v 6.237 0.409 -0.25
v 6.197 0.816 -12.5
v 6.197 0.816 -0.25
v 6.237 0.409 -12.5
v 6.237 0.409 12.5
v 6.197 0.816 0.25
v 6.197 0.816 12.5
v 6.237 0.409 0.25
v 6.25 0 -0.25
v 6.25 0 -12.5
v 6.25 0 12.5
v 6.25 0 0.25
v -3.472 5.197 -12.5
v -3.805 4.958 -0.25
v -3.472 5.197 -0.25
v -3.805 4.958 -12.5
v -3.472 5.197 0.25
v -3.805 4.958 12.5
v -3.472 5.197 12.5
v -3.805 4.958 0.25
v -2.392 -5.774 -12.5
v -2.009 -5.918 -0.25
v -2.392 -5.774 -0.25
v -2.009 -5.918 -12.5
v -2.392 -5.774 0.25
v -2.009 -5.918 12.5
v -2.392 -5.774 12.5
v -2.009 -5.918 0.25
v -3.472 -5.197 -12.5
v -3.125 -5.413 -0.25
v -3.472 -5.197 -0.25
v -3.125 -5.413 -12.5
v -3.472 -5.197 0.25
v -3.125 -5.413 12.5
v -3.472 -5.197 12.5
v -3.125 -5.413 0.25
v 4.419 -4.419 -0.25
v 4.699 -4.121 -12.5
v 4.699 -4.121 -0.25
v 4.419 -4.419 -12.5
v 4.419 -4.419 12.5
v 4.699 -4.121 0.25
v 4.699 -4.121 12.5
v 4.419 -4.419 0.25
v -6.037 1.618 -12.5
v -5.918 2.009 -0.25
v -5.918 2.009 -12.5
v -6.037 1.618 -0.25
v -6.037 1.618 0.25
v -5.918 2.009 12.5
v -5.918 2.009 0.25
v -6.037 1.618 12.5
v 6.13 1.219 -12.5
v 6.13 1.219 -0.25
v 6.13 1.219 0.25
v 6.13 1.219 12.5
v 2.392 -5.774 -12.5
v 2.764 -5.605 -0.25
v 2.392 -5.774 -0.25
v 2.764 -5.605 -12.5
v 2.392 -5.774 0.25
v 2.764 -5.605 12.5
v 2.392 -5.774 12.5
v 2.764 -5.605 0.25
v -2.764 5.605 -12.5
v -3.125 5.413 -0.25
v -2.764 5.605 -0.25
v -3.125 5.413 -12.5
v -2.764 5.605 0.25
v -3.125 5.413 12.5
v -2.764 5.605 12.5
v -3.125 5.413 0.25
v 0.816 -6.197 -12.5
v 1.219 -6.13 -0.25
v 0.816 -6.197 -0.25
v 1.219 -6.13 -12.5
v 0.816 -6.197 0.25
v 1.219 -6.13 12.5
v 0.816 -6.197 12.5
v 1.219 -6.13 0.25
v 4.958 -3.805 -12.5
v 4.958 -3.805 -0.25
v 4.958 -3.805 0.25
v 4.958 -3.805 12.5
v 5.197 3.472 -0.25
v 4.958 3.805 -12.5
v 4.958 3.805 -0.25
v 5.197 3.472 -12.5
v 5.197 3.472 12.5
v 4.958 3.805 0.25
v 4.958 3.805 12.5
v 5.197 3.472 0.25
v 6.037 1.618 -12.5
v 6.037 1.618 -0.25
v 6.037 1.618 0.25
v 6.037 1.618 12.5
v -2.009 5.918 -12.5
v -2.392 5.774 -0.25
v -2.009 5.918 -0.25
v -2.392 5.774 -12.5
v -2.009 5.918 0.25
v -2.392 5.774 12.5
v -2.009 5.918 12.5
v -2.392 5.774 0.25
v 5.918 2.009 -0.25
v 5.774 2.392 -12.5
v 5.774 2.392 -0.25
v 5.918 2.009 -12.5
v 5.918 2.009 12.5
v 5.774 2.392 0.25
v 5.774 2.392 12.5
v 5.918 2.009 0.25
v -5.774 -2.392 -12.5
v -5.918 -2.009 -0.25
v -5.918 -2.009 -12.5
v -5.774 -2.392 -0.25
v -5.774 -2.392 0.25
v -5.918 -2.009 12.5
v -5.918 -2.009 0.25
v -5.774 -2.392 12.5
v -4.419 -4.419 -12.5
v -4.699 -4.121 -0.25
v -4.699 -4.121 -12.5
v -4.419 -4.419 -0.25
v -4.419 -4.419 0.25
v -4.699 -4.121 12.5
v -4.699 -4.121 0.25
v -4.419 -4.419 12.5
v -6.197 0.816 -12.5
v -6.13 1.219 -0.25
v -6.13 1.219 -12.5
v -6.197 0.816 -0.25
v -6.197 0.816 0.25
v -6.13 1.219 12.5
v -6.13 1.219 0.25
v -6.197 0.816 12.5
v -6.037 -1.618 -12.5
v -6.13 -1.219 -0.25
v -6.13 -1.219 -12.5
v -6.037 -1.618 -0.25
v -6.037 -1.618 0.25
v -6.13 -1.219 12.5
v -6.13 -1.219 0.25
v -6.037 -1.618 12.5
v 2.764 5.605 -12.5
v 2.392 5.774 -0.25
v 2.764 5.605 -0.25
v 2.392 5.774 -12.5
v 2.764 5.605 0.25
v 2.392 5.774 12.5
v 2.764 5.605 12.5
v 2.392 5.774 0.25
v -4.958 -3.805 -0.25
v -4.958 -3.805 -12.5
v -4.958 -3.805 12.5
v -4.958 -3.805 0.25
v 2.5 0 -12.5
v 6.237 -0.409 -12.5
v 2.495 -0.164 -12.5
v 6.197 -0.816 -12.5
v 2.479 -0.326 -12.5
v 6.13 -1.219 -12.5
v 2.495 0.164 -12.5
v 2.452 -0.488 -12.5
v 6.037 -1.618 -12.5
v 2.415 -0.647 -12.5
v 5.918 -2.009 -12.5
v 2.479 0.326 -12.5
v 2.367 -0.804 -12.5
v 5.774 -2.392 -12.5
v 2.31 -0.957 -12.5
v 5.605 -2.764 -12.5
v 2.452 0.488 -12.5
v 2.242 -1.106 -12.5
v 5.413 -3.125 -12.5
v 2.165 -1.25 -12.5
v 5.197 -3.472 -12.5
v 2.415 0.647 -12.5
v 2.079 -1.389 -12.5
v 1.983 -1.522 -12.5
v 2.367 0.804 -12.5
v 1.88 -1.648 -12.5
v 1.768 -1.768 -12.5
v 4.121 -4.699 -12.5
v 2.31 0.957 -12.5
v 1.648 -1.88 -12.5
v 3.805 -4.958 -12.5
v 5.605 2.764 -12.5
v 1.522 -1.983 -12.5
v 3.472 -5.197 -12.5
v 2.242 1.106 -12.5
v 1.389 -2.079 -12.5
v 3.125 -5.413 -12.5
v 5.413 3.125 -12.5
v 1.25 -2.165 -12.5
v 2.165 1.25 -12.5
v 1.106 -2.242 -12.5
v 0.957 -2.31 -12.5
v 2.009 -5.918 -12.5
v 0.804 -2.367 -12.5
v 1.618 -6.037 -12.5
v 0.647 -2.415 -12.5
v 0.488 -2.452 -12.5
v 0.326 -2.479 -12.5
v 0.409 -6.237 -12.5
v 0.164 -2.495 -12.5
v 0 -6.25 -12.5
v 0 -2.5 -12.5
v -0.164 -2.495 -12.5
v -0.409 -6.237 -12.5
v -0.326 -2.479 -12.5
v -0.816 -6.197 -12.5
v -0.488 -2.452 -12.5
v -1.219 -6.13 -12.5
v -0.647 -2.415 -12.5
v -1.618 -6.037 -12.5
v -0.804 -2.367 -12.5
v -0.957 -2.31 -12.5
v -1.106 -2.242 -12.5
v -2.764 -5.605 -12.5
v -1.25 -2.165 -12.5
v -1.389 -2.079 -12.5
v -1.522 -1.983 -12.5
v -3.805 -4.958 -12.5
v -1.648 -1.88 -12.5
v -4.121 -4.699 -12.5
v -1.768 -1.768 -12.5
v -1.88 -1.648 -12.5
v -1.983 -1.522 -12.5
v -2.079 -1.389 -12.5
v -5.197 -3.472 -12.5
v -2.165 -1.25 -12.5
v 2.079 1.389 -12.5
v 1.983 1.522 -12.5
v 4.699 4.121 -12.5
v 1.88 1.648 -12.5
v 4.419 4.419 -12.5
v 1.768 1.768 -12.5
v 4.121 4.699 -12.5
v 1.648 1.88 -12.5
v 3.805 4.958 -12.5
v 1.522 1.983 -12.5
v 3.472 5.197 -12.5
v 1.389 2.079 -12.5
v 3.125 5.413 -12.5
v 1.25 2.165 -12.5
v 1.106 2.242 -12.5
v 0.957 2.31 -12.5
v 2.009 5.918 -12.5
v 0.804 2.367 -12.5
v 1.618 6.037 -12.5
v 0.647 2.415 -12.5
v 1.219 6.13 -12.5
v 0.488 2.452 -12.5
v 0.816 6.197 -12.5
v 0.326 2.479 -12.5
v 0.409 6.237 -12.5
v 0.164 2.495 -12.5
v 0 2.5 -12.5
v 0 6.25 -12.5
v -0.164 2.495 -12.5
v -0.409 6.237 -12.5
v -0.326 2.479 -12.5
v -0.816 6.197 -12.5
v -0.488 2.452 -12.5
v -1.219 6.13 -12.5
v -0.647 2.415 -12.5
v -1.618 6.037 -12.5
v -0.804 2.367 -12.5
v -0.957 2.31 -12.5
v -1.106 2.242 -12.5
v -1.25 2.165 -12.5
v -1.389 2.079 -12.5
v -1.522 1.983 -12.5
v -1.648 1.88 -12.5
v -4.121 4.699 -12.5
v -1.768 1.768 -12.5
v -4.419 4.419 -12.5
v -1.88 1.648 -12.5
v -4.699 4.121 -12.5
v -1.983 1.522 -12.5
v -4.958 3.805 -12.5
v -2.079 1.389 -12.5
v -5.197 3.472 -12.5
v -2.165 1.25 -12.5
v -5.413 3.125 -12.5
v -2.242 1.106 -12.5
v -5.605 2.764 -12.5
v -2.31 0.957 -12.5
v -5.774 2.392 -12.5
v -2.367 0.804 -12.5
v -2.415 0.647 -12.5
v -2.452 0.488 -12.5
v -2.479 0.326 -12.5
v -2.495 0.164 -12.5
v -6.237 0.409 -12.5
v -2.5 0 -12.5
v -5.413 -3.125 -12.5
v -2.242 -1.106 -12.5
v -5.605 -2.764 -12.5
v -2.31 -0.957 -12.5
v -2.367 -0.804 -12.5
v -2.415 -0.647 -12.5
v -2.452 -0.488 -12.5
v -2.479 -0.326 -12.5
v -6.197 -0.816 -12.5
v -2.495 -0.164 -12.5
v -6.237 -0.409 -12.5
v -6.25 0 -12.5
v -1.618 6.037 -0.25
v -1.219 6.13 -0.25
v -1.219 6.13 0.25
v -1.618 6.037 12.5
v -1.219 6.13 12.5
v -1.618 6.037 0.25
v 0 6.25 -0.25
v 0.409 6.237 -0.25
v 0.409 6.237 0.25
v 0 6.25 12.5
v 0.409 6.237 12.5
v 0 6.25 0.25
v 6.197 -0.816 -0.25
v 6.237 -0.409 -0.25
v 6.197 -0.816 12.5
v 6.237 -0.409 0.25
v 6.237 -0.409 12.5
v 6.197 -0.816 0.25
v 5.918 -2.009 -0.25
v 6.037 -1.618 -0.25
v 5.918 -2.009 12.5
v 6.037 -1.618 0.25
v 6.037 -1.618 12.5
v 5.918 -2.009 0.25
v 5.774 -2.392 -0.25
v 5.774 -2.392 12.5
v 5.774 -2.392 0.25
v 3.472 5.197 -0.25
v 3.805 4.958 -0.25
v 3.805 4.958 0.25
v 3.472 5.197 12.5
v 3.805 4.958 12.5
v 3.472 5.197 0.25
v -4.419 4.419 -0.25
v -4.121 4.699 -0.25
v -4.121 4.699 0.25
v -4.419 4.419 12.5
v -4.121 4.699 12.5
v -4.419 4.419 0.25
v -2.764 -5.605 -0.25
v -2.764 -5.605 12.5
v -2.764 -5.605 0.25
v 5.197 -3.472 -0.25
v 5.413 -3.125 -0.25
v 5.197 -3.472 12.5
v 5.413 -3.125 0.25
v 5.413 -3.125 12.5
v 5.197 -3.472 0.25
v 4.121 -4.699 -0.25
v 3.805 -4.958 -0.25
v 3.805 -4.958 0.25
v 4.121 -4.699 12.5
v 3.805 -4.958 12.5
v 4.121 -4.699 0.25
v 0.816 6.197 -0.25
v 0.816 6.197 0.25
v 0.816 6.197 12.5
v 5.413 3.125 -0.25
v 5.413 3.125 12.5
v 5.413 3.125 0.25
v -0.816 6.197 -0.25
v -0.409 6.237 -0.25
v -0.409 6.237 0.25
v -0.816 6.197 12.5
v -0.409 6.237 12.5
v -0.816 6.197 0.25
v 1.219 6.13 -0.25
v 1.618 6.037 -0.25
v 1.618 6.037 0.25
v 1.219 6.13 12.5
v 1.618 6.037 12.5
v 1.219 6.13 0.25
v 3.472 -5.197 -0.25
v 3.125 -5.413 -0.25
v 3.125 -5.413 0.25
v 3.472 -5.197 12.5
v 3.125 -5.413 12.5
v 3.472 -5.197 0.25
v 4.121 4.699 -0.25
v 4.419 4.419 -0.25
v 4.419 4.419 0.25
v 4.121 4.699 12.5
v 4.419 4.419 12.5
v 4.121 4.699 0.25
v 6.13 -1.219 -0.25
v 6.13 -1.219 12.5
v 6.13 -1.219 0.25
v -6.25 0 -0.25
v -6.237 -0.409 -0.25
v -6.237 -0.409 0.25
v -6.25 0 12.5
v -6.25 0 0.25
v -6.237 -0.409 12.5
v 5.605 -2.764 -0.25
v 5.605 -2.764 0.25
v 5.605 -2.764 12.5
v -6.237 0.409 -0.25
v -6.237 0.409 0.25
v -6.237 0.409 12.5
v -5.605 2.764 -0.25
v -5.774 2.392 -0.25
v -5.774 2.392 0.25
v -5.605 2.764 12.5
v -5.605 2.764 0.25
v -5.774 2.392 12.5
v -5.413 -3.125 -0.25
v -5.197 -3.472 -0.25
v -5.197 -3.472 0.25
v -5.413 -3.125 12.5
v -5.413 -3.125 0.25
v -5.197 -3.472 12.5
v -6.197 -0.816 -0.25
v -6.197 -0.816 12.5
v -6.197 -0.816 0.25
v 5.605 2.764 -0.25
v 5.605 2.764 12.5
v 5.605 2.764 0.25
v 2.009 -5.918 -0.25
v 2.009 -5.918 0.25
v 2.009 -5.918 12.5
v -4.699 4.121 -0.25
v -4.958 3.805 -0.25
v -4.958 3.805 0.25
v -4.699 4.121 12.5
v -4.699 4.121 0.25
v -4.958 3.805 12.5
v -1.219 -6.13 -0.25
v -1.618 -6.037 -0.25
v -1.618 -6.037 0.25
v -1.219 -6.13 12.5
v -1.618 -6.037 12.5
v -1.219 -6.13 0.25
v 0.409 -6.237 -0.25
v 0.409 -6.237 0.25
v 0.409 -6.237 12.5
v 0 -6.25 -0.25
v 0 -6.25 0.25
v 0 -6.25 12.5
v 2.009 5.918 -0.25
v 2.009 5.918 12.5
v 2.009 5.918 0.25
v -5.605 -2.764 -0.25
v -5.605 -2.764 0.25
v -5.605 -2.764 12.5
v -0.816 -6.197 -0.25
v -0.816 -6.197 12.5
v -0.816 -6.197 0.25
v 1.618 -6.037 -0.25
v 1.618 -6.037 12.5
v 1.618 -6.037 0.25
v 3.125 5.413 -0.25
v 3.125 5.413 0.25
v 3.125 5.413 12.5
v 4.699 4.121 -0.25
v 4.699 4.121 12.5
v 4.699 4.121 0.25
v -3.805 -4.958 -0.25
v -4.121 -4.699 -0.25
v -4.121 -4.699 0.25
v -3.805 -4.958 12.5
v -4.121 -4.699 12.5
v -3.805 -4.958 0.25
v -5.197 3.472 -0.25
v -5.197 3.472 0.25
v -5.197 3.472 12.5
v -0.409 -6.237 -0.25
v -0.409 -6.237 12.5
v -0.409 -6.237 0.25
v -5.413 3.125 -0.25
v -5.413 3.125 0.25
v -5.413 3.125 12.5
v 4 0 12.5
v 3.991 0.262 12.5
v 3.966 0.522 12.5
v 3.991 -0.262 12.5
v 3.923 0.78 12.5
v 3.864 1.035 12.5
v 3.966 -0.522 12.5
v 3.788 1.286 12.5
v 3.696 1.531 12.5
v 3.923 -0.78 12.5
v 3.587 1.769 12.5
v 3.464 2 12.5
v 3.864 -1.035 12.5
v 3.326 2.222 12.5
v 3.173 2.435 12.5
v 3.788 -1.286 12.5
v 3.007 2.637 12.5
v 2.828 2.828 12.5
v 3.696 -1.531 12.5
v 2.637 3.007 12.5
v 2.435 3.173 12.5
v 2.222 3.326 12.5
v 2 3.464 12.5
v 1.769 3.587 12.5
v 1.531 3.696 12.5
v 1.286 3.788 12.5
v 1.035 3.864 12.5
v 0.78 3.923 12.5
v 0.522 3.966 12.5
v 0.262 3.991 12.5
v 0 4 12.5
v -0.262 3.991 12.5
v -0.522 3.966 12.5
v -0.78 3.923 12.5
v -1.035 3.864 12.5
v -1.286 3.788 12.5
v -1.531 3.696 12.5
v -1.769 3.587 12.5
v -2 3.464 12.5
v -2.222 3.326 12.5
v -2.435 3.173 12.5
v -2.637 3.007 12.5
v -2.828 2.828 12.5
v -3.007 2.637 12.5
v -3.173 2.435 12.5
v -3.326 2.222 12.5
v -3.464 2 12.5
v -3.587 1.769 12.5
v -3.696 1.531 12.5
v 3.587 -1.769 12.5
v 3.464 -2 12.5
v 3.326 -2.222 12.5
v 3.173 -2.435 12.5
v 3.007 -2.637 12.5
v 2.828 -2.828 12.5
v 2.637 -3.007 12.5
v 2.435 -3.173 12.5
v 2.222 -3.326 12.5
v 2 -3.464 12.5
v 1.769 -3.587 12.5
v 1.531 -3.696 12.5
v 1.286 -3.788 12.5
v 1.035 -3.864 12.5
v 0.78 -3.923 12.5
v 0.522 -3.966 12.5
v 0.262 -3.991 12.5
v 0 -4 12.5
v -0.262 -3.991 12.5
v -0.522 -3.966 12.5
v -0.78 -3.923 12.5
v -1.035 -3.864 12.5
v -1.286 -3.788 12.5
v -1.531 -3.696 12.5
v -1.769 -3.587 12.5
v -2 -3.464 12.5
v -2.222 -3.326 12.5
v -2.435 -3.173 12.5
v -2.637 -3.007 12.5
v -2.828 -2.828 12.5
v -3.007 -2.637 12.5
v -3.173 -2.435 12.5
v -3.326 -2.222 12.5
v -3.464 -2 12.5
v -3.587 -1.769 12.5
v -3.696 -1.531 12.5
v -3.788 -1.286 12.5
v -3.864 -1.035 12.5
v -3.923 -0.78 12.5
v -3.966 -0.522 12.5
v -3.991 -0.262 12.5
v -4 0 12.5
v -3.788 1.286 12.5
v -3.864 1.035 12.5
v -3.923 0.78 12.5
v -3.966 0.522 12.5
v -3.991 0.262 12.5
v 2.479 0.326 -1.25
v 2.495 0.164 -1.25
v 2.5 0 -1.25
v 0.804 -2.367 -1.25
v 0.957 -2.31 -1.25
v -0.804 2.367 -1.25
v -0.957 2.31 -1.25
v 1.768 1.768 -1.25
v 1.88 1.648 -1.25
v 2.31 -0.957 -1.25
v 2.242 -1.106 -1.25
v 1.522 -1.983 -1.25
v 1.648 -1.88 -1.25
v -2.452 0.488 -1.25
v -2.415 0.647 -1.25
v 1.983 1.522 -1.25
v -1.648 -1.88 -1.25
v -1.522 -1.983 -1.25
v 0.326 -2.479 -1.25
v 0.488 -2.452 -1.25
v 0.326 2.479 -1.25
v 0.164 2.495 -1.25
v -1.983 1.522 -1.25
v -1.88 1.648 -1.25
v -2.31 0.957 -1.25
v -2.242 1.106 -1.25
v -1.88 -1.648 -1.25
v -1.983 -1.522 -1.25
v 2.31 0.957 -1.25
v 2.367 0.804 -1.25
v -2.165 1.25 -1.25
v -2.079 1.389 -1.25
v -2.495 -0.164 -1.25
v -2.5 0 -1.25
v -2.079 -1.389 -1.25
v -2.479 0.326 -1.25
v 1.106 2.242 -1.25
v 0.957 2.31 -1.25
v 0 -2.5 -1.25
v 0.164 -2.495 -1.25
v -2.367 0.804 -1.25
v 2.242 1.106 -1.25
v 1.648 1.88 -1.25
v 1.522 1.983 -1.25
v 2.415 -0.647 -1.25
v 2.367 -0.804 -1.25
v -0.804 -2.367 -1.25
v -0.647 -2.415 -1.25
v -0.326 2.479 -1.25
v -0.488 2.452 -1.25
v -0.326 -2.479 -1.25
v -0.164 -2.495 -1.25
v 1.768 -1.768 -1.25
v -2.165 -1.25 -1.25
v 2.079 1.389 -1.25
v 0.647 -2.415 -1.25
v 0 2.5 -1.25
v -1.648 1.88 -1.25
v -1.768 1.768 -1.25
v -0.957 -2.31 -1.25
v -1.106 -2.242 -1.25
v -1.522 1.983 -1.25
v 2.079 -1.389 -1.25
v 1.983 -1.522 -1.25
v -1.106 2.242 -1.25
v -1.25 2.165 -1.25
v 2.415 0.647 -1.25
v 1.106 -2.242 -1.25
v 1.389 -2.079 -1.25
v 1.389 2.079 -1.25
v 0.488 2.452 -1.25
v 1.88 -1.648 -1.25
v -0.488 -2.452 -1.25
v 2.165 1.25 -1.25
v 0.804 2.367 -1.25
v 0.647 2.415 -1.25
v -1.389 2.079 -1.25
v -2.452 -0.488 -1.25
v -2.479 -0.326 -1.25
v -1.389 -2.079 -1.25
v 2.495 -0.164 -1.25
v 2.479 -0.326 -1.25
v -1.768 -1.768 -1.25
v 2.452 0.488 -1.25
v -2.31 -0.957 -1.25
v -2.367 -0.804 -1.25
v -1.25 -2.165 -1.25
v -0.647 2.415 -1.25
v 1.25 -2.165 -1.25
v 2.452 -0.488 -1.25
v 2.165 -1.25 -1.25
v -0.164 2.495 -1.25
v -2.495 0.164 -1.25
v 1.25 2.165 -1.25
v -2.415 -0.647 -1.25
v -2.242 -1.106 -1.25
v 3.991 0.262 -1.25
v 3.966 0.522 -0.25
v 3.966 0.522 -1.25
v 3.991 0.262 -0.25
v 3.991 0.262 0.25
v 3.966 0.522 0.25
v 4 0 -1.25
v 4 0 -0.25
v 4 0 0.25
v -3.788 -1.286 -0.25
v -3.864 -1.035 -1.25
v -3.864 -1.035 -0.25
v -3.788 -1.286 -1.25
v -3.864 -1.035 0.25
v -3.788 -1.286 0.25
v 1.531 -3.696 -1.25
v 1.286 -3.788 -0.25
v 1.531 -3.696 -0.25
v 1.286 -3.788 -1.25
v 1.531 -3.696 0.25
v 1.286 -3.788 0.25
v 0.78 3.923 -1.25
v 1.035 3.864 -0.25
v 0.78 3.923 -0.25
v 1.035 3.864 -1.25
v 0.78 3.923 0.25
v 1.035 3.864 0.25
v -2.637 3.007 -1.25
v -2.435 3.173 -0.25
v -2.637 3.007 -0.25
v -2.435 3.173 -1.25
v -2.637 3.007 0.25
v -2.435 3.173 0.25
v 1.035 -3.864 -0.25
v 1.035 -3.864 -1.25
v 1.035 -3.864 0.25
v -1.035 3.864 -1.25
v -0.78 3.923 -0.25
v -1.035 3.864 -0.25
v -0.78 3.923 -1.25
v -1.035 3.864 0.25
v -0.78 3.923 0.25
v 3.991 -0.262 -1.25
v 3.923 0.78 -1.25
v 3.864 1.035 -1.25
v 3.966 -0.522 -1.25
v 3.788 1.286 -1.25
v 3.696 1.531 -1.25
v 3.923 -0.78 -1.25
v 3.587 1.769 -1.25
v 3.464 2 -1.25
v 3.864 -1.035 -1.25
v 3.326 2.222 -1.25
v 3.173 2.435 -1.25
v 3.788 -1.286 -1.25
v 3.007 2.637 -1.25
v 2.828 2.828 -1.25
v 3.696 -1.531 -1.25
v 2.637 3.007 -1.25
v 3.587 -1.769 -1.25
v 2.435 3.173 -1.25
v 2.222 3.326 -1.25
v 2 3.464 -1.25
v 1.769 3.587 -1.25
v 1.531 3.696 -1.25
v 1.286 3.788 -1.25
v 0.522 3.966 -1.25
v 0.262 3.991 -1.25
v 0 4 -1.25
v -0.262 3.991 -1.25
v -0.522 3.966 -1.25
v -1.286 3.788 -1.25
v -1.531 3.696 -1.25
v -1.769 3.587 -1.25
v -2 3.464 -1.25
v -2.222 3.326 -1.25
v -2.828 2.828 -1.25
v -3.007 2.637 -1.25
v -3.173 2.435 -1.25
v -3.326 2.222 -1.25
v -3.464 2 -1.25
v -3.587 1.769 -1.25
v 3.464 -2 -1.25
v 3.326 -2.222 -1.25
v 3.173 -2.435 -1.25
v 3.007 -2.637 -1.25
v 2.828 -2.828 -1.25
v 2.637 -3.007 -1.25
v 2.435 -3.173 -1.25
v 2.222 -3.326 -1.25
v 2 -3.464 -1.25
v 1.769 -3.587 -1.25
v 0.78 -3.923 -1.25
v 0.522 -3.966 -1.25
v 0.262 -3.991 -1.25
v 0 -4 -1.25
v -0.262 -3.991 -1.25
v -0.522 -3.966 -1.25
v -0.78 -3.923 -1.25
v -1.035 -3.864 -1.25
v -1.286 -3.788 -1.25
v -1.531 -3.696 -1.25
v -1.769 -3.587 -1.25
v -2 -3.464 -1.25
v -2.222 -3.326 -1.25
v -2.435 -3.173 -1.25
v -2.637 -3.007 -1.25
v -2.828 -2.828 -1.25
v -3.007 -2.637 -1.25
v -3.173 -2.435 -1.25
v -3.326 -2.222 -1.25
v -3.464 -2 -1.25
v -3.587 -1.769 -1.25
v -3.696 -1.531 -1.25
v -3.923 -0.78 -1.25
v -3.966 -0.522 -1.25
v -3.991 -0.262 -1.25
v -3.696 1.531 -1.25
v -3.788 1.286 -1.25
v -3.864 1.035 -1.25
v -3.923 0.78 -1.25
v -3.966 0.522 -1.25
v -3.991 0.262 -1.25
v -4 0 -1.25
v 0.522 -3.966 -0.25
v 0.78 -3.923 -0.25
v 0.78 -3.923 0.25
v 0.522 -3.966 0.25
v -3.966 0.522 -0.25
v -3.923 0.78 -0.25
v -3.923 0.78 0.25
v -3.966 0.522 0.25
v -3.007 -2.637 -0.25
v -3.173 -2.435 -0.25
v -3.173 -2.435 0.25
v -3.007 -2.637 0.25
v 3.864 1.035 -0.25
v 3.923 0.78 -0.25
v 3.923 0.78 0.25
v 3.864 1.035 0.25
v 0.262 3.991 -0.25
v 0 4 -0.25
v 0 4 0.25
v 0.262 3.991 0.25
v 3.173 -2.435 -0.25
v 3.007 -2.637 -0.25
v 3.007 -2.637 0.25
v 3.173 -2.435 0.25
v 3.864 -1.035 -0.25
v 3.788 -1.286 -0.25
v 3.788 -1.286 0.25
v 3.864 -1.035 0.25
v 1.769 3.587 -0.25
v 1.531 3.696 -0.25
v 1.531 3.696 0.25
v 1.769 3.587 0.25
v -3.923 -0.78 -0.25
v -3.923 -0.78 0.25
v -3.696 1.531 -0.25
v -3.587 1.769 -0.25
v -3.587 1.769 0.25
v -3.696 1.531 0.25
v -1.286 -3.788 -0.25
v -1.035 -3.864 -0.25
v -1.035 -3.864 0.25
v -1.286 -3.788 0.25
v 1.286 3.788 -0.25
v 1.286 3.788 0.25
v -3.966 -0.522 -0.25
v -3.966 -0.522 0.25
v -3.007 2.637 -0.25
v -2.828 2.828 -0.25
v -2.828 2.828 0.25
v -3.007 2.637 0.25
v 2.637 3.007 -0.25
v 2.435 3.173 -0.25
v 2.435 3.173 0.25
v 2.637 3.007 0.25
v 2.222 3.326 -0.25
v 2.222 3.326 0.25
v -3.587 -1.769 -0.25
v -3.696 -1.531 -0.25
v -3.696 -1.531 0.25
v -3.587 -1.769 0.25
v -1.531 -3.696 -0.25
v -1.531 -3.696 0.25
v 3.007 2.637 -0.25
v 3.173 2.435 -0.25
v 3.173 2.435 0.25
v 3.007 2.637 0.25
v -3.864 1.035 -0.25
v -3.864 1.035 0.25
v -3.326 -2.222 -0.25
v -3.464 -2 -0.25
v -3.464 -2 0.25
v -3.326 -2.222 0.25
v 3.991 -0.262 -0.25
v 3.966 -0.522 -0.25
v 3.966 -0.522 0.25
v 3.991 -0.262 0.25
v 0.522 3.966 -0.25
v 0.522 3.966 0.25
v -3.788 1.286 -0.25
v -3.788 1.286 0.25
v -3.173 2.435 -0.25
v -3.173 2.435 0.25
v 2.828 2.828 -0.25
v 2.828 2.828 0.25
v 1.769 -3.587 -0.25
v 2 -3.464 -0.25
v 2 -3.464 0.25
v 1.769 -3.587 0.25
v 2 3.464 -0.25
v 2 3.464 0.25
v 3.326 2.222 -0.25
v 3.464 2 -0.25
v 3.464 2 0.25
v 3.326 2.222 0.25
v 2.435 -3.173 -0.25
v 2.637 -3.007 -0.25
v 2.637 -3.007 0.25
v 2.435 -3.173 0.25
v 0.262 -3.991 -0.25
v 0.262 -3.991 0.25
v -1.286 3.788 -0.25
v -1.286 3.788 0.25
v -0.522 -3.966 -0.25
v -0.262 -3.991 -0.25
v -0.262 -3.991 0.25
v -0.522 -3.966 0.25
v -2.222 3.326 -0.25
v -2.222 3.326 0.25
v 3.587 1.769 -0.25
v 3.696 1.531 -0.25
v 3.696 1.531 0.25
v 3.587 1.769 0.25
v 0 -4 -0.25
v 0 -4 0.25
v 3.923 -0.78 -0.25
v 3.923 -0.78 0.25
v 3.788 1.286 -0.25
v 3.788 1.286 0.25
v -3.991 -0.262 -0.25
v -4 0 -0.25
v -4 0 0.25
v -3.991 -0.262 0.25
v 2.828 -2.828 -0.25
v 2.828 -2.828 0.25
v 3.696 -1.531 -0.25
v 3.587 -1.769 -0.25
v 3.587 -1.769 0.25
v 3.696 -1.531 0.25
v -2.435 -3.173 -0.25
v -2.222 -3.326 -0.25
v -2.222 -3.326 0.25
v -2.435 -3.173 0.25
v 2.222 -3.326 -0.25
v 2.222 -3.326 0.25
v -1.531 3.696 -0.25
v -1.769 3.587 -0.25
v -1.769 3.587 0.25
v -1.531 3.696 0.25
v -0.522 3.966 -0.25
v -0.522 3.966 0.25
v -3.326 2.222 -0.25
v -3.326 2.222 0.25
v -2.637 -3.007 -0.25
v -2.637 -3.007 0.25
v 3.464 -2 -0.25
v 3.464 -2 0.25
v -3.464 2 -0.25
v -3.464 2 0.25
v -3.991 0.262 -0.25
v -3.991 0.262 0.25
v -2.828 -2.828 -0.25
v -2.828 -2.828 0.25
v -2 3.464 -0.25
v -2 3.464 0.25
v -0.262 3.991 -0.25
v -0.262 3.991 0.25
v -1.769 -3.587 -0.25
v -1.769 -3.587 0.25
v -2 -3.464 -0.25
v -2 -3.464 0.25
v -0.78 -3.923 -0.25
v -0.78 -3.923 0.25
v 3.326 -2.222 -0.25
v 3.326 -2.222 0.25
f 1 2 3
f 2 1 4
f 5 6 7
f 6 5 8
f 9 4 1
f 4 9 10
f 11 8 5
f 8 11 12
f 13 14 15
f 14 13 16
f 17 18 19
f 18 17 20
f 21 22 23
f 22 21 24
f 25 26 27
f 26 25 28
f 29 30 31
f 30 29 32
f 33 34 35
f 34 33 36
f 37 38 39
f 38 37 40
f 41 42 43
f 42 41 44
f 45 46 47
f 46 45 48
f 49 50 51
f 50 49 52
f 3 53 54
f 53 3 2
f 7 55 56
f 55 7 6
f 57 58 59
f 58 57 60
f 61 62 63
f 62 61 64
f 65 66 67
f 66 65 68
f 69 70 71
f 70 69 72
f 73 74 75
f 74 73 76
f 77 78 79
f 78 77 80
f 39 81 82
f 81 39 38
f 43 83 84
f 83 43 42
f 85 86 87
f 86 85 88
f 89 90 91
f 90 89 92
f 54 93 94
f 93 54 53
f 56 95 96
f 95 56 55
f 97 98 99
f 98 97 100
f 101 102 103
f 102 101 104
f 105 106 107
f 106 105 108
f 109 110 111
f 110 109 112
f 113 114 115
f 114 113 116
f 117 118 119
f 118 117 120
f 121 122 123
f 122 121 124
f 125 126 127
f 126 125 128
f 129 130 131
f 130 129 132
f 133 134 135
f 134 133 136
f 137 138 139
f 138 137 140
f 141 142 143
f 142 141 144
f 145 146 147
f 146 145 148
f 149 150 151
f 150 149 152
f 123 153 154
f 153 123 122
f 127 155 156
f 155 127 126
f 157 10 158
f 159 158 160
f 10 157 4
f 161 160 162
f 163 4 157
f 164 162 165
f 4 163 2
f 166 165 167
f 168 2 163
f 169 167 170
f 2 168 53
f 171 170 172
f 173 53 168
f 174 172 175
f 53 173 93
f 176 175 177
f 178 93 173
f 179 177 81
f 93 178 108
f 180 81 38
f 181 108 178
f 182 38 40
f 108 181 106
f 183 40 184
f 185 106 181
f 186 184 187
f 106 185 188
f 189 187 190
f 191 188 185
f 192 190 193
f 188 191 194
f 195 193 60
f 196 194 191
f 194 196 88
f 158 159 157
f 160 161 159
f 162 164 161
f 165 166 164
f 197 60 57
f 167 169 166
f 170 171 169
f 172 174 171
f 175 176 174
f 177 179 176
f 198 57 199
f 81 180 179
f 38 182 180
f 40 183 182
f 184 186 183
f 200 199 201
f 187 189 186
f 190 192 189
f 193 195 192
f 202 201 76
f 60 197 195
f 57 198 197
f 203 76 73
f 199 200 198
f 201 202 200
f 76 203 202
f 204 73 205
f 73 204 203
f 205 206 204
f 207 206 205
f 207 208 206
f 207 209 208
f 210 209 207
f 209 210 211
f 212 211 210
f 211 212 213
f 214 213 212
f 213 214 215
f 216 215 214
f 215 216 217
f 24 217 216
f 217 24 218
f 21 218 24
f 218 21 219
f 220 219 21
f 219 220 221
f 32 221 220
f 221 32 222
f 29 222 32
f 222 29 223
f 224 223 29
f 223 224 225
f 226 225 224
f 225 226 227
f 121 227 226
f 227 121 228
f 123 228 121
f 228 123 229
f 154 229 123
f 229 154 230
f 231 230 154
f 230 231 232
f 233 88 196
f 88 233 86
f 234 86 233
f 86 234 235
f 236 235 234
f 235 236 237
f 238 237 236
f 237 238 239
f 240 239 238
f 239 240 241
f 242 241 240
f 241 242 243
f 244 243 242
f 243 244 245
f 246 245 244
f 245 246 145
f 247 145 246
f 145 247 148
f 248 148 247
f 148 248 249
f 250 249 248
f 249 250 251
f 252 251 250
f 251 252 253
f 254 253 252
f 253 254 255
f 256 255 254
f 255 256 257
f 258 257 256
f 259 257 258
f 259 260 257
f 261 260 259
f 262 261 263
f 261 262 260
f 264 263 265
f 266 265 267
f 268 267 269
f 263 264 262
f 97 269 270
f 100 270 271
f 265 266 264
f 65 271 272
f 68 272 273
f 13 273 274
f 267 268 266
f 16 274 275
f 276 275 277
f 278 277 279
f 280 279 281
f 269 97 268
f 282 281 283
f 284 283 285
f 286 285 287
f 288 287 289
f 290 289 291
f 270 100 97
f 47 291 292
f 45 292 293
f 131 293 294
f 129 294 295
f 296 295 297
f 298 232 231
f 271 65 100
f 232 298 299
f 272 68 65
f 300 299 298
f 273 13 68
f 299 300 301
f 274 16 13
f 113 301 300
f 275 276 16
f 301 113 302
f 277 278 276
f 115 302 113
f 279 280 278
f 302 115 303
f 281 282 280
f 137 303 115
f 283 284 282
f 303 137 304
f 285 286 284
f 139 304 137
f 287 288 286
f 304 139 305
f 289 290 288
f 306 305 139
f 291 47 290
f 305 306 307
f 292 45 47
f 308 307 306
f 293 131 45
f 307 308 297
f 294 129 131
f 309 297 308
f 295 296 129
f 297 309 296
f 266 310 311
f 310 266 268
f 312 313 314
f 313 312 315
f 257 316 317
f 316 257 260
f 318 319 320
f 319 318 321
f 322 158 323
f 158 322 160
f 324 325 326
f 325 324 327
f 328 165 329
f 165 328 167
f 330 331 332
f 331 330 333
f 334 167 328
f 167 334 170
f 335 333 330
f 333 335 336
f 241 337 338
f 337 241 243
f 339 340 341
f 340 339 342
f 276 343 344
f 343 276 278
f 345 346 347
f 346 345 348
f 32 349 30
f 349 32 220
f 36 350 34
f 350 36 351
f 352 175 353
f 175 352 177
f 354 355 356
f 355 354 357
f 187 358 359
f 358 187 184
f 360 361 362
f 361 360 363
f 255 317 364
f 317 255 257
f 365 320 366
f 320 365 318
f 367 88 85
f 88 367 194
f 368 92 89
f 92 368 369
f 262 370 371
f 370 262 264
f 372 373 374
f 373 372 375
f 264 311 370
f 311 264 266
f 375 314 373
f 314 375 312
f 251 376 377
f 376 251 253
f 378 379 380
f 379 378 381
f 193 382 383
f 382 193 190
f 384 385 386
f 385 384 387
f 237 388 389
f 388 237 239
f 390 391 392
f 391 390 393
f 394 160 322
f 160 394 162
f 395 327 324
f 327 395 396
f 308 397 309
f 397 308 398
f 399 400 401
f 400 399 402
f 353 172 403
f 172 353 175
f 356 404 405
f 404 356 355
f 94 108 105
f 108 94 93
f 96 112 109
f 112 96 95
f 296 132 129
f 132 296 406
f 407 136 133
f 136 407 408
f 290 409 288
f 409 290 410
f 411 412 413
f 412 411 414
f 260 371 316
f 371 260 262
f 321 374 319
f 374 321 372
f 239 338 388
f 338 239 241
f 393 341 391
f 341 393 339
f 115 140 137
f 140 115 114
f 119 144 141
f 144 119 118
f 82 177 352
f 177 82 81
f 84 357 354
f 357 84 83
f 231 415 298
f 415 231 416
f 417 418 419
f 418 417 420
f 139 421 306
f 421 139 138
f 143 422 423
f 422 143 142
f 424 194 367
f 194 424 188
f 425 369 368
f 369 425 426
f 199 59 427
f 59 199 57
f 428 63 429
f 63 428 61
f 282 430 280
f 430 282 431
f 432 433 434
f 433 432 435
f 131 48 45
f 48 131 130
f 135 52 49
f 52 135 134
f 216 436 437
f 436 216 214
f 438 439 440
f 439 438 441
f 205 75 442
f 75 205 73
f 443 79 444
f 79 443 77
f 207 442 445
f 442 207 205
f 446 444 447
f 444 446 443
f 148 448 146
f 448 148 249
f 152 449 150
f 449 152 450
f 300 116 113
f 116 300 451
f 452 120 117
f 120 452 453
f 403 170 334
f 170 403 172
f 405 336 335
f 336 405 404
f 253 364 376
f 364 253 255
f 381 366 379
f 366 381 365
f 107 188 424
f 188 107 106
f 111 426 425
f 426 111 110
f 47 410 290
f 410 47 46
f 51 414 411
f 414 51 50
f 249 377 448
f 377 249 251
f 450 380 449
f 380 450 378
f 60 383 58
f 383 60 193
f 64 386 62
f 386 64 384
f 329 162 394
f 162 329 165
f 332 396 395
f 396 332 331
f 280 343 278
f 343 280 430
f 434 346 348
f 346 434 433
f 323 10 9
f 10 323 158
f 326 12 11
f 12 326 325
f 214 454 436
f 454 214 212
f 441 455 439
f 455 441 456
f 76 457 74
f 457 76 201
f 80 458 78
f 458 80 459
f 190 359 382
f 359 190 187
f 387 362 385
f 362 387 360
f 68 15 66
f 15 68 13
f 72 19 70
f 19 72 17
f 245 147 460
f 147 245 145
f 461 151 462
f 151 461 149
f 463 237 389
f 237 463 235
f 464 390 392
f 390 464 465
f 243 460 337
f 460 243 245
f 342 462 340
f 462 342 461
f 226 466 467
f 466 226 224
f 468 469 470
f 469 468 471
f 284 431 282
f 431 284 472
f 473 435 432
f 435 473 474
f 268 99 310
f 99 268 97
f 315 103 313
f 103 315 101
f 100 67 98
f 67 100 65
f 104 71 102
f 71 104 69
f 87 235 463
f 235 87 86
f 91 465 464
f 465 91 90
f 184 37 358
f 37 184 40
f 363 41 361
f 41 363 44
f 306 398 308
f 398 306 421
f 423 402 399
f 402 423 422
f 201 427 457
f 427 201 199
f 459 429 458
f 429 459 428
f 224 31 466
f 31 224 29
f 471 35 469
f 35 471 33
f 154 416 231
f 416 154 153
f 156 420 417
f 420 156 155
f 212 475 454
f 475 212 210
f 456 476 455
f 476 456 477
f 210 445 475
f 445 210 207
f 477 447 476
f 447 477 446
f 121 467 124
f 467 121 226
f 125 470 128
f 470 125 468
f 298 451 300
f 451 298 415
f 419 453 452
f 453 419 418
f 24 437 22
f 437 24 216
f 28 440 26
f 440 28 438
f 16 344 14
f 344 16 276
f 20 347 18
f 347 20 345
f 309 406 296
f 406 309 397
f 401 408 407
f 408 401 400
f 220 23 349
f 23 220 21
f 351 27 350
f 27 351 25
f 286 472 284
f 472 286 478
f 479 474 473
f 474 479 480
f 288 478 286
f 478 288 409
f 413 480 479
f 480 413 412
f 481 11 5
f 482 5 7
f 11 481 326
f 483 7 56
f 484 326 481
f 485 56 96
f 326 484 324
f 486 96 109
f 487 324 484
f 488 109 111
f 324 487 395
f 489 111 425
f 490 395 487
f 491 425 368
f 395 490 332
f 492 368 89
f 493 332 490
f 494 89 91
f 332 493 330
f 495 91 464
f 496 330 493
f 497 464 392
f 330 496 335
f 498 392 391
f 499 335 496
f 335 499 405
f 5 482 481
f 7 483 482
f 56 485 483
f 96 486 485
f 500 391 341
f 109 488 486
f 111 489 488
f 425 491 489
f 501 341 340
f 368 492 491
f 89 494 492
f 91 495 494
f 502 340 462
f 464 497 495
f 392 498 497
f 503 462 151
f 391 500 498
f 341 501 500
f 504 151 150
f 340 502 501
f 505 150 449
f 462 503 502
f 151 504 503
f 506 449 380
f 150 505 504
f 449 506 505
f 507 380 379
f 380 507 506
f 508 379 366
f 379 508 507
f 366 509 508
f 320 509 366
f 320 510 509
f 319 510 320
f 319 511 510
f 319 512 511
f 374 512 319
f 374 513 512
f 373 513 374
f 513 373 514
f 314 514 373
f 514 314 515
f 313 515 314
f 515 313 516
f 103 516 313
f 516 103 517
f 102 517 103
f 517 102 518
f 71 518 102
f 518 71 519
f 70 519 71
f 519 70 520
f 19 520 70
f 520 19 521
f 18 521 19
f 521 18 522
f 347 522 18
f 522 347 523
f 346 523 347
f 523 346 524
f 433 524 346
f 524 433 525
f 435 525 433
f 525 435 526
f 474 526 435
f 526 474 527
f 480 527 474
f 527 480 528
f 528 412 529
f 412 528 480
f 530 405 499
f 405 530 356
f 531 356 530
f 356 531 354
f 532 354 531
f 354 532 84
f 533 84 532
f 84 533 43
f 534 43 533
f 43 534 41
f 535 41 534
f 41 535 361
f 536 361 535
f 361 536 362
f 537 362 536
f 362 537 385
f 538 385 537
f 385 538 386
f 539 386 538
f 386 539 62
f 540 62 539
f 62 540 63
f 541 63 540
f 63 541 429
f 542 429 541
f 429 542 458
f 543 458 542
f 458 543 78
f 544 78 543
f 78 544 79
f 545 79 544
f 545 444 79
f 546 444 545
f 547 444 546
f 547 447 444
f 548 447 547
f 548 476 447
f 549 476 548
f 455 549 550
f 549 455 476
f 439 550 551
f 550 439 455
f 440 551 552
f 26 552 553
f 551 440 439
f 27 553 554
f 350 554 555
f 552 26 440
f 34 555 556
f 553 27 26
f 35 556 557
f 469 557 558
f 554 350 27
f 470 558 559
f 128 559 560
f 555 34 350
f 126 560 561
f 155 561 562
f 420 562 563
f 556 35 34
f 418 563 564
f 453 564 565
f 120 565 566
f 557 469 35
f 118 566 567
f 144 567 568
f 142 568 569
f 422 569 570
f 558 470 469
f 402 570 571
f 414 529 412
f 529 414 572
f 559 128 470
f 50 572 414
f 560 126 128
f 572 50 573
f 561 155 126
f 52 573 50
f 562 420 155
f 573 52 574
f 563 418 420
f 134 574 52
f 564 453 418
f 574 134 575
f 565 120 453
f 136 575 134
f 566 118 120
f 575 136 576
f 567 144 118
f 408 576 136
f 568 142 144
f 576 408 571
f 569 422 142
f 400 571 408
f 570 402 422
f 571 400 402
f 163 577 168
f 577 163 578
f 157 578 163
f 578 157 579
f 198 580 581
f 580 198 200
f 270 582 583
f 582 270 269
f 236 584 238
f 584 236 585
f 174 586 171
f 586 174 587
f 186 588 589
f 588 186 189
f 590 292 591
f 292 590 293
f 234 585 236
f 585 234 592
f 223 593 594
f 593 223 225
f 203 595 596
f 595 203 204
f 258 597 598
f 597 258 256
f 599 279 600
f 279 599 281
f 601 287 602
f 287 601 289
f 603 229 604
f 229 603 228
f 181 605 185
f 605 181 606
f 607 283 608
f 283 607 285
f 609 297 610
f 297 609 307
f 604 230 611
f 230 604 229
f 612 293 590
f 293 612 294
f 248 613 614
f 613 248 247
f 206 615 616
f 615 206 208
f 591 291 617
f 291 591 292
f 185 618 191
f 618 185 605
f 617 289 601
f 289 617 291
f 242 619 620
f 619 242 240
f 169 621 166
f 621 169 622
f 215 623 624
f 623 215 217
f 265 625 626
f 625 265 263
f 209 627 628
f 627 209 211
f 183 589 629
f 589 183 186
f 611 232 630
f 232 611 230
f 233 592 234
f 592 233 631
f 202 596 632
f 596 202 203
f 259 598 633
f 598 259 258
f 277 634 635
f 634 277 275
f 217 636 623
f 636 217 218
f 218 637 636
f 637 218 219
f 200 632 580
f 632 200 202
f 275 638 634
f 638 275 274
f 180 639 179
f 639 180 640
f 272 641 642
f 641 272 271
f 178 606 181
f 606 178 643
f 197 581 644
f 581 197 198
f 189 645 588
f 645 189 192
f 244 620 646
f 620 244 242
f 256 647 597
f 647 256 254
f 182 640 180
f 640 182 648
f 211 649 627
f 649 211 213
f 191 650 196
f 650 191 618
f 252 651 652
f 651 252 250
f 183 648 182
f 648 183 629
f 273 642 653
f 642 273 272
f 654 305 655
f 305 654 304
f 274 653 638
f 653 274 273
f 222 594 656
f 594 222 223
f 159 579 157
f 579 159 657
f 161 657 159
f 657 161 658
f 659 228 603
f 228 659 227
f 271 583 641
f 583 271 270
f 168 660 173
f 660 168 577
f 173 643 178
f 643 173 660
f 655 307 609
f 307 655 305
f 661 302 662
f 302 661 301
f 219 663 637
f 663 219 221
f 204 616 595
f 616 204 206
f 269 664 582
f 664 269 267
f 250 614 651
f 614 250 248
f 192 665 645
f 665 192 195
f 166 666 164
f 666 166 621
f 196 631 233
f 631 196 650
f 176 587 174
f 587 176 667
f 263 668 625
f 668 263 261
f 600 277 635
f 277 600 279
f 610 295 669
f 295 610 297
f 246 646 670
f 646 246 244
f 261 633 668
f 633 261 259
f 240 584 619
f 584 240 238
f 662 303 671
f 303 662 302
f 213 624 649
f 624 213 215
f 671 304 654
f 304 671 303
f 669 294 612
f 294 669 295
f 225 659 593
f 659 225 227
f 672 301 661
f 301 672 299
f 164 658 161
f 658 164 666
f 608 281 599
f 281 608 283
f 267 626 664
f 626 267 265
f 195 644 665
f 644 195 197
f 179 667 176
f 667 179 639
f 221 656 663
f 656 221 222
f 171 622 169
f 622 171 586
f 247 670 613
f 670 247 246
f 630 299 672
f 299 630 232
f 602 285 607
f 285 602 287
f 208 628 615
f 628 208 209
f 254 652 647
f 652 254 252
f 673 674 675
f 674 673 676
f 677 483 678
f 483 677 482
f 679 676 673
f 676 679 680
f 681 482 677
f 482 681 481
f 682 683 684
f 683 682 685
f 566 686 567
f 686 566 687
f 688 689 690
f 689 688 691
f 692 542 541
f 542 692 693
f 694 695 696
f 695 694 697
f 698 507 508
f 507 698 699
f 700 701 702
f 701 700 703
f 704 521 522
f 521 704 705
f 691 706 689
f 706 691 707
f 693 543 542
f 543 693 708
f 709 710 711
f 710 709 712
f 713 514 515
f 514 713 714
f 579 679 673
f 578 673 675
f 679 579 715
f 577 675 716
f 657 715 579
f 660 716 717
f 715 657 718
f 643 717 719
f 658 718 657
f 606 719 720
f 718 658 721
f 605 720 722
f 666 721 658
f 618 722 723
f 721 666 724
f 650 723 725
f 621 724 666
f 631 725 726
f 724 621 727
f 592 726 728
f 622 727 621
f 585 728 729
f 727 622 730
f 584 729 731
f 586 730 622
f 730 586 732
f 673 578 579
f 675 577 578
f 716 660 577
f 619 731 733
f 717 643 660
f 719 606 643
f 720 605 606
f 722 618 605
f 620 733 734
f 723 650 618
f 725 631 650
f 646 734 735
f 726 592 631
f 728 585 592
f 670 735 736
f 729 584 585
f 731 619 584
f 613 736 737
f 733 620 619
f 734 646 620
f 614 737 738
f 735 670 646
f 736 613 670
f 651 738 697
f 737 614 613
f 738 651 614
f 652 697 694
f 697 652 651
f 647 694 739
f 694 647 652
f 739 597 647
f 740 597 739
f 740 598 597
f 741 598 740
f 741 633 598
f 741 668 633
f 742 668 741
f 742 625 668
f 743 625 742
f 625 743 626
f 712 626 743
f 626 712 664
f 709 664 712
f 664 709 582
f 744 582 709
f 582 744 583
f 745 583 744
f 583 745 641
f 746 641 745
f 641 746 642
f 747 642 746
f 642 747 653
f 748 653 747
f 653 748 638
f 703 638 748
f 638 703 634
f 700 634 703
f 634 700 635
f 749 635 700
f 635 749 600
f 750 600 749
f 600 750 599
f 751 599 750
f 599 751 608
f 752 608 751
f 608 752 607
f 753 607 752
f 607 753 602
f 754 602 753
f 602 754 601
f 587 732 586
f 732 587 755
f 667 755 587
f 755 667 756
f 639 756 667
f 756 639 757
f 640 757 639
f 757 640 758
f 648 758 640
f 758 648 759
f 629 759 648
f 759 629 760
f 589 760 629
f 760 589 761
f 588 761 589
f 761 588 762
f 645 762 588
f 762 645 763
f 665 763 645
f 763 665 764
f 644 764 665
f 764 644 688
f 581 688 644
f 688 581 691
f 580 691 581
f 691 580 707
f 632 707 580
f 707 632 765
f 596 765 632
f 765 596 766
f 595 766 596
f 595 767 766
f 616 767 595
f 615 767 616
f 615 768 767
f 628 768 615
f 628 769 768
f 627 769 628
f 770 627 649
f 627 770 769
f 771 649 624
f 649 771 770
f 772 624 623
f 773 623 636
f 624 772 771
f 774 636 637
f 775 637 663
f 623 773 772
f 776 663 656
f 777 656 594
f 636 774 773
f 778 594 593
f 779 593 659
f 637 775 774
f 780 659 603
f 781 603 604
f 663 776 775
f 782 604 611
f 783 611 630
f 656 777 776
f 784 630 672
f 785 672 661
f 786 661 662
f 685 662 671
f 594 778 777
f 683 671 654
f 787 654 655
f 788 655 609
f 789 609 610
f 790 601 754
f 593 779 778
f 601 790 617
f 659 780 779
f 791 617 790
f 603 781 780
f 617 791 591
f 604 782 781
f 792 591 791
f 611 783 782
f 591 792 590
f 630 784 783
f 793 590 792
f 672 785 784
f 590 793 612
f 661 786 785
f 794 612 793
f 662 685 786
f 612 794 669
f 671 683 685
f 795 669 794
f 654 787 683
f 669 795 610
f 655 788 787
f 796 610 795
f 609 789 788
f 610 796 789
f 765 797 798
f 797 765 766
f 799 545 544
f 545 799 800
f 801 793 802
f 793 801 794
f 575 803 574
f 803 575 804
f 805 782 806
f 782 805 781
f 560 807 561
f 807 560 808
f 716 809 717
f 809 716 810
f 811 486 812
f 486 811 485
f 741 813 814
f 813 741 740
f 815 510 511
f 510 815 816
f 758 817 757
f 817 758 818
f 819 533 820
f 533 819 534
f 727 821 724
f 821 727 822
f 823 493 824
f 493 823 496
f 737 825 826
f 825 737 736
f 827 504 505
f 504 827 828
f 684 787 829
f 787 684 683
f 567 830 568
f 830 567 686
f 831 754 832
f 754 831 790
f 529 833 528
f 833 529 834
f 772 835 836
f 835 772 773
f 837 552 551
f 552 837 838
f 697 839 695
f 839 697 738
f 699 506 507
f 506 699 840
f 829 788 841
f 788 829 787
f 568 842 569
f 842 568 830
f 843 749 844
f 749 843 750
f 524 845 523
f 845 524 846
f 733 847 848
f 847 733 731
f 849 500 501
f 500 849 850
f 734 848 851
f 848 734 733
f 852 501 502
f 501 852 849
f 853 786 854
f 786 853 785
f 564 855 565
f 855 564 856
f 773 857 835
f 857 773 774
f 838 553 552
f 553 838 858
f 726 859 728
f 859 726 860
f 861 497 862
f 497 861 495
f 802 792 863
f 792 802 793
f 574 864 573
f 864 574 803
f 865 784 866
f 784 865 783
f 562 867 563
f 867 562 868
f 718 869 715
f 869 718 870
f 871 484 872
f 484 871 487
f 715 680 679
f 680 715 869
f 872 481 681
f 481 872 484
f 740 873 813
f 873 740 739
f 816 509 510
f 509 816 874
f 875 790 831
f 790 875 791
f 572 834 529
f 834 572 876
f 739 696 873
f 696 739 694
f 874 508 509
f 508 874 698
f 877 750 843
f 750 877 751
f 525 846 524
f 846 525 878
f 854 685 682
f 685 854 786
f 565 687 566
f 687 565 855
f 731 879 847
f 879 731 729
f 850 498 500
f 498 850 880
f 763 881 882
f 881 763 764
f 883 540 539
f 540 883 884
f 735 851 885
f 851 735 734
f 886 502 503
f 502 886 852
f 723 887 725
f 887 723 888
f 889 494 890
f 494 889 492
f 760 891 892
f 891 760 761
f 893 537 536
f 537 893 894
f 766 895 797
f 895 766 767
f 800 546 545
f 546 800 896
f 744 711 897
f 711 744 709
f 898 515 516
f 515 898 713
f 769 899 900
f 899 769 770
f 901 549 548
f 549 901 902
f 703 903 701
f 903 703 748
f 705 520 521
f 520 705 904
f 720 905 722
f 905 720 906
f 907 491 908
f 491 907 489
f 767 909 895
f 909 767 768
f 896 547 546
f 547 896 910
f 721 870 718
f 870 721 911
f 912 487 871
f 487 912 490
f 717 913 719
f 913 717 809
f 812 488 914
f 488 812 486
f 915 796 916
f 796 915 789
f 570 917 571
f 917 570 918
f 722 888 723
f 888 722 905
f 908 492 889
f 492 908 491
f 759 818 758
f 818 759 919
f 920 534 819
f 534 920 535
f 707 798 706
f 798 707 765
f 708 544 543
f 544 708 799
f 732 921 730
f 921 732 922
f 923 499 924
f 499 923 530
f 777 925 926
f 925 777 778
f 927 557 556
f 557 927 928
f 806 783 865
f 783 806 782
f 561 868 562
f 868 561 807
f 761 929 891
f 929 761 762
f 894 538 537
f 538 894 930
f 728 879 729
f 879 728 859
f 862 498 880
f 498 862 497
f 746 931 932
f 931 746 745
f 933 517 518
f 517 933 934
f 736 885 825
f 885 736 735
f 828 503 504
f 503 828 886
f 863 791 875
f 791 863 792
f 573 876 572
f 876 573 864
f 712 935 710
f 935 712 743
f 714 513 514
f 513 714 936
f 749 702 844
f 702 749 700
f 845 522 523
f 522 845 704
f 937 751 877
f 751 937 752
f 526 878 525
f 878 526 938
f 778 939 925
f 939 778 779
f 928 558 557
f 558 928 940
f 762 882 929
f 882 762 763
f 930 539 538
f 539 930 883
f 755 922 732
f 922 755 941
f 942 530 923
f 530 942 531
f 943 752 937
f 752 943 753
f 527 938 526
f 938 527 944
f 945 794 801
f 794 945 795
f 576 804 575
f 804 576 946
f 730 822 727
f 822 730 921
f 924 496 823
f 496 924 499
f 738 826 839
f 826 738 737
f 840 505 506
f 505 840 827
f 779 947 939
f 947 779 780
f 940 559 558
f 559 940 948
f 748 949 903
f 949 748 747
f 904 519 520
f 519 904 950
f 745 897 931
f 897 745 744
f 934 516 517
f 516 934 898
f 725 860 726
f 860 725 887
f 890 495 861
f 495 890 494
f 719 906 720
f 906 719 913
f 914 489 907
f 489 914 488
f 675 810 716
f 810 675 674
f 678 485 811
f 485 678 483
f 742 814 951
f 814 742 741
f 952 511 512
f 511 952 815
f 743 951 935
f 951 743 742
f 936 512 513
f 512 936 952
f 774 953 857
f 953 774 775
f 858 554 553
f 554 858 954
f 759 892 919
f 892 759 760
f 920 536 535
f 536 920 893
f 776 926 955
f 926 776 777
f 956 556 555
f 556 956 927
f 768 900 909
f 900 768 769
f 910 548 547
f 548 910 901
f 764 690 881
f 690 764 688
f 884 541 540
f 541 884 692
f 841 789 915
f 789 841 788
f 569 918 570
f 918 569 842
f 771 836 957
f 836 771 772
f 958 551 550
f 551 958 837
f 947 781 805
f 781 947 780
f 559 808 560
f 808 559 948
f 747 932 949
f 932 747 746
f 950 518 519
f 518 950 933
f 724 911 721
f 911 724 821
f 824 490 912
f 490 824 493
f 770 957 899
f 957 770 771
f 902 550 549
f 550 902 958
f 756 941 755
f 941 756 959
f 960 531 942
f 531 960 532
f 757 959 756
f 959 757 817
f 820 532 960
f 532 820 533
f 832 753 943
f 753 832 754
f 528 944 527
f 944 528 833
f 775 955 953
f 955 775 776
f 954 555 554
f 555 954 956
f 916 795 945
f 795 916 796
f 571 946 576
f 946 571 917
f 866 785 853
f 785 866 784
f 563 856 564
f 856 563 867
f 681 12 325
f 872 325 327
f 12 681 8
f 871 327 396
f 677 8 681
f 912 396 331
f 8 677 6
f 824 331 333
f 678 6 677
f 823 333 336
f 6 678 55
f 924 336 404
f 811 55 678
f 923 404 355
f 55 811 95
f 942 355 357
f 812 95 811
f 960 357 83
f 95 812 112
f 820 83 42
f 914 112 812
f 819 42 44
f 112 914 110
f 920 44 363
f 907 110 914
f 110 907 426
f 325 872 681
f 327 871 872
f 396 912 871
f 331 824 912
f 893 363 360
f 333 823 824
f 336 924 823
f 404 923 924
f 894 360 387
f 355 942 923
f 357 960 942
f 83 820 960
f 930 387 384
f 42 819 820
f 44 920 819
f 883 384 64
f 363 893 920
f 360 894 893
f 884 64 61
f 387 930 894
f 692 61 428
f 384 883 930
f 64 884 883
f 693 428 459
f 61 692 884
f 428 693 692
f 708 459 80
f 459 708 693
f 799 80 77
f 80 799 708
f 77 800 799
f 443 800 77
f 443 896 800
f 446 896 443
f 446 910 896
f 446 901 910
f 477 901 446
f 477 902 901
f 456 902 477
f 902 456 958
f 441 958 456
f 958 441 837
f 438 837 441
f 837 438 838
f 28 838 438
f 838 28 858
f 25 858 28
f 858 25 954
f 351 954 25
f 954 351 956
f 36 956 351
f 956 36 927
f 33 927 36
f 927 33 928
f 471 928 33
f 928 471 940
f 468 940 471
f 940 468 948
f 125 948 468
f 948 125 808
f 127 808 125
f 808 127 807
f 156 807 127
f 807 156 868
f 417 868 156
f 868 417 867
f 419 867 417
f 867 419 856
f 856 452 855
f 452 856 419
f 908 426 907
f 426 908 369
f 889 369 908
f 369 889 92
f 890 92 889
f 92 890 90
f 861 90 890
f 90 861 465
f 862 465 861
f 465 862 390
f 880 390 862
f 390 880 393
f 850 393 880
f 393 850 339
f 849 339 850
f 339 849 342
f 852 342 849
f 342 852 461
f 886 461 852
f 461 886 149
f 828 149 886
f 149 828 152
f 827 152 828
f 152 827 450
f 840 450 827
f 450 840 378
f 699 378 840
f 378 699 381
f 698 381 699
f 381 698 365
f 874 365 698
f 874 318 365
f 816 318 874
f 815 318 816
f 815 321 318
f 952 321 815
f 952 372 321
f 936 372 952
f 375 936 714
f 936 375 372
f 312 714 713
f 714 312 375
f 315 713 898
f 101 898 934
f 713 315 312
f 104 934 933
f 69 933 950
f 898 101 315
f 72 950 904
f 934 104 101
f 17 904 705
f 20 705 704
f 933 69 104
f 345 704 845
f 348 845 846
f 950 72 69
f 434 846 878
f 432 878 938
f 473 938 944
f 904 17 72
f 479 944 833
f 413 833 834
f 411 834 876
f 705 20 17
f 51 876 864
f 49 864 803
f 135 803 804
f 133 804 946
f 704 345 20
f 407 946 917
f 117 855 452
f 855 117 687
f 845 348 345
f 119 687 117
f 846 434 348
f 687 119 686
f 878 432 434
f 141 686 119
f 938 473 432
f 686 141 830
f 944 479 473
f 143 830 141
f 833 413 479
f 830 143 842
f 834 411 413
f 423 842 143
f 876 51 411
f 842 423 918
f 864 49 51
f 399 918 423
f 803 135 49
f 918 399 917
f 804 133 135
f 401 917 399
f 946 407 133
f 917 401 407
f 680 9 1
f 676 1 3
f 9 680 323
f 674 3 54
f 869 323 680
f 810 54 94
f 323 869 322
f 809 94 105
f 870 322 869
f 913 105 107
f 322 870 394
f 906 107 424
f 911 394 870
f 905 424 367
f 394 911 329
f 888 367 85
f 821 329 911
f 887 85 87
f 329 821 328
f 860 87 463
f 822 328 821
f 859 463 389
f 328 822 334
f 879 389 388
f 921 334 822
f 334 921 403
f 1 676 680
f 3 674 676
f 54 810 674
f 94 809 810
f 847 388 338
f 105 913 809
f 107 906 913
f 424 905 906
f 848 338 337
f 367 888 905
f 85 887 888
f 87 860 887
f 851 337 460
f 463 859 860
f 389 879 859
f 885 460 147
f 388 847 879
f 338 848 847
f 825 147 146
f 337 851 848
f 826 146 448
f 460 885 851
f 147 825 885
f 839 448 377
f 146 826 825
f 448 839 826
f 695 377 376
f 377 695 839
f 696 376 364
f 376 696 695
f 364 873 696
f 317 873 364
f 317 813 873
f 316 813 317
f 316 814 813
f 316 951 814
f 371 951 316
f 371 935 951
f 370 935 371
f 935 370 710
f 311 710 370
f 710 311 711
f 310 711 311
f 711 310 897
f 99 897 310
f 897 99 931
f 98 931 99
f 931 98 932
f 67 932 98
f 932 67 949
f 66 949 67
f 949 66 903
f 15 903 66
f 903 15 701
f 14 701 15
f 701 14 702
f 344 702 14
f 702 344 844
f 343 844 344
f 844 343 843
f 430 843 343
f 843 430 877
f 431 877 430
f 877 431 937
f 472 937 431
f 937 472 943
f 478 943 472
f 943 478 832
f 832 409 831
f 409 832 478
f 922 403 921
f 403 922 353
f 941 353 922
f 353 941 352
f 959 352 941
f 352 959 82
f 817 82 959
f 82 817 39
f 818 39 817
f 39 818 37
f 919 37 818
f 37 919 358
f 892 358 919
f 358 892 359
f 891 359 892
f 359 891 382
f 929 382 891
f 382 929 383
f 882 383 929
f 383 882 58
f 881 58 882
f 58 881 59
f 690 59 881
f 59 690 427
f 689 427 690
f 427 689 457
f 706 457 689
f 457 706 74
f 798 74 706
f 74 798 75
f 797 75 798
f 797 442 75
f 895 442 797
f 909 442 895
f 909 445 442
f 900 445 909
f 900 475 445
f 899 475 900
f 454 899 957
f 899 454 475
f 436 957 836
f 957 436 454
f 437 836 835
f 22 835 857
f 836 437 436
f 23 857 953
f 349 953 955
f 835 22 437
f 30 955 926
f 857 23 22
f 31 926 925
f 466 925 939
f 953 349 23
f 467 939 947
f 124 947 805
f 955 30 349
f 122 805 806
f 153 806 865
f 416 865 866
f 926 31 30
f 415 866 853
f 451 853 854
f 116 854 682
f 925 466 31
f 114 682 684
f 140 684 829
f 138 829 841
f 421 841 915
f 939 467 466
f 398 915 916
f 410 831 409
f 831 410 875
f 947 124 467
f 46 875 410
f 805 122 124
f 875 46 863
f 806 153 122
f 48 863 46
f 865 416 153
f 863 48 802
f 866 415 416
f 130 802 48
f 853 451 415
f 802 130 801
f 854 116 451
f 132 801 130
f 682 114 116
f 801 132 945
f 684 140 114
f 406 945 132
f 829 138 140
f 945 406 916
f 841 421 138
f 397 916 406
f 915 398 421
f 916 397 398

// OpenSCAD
// Parameters
length_mm = 25; //[12.5:50:0.5]
outer_diameter_mm = 12.5; //[6.25:25:0.25]
bore1_diameter_mm = 5; //[2.5:10:0.1]
bore2_diameter_mm = 8; //[4:16:0.1]
bore_transition_location_mm_from_center = 0; //[-5:5:0.1]
bore_overlap_mm = 1; //[0.5:2:0.1]
split_plane_thickness_mm = 0.5; //[0.2:2:0.1]

// Shaft Coupling - single connected solid (no floating halves, no gap)
module shaft_coupling() {
  // Overlap to guarantee physical connection between the two outer halves
  overlap_mm = 1.5; // 1-2mm as required

  // Clamp transition so it stays inside the coupling length
  t = max(min(bore_transition_location_mm_from_center, length_mm/2 - 1), -(length_mm/2 - 1));

  // Build two outer halves that OVERLAP around the split plane (z=t)
  // Each half is length/2 + overlap, positioned so they intersect by overlap.
  half_h = length_mm/2 + overlap_mm;

  // Centers chosen so:
  // lower half spans: [t - length/2, t + overlap]
  // upper half spans: [t - overlap,  t + length/2]
  z_lower = t - length_mm/4 + overlap_mm/2;
  z_upper = t + length_mm/4 - overlap_mm/2;

  color("Silver")
  difference() {
    // OUTER BODY: union of two overlapping cylinders -> one connected solid
    union() {
      translate([0, 0, z_lower])
        cylinder(r=outer_diameter_mm/2, h=half_h, center=true, $fn=96);

      translate([0, 0, z_upper])
        cylinder(r=outer_diameter_mm/2, h=half_h, center=true, $fn=96);
    }

    // BORES + split relief: subtraction volumes (do not create disconnection)
    union() {
      // Bore 1 (5mm) - lower side, extends slightly past split plane
      translate([0, 0, t - length_mm/4])
        cylinder(r=bore1_diameter_mm/2,
                 h=length_mm/2 + bore_overlap_mm + overlap_mm,
                 center=true, $fn=96);

      // Bore 2 (8mm) - upper side, extends slightly past split plane
      translate([0, 0, t + length_mm/4])
        cylinder(r=bore2_diameter_mm/2,
                 h=length_mm/2 + bore_overlap_mm + overlap_mm,
                 center=true, $fn=96);

      // Split plane relief (thin ring cut). Outer halves overlap so body stays connected.
      translate([0, 0, t])
        cylinder(r=outer_diameter_mm/2 + bore_overlap_mm,
                 h=split_plane_thickness_mm,
                 center=true, $fn=96);
    }
  }
}

// Assembly
module assembly() {
  union() {
    shaft_coupling();
  }
}

assembly();
